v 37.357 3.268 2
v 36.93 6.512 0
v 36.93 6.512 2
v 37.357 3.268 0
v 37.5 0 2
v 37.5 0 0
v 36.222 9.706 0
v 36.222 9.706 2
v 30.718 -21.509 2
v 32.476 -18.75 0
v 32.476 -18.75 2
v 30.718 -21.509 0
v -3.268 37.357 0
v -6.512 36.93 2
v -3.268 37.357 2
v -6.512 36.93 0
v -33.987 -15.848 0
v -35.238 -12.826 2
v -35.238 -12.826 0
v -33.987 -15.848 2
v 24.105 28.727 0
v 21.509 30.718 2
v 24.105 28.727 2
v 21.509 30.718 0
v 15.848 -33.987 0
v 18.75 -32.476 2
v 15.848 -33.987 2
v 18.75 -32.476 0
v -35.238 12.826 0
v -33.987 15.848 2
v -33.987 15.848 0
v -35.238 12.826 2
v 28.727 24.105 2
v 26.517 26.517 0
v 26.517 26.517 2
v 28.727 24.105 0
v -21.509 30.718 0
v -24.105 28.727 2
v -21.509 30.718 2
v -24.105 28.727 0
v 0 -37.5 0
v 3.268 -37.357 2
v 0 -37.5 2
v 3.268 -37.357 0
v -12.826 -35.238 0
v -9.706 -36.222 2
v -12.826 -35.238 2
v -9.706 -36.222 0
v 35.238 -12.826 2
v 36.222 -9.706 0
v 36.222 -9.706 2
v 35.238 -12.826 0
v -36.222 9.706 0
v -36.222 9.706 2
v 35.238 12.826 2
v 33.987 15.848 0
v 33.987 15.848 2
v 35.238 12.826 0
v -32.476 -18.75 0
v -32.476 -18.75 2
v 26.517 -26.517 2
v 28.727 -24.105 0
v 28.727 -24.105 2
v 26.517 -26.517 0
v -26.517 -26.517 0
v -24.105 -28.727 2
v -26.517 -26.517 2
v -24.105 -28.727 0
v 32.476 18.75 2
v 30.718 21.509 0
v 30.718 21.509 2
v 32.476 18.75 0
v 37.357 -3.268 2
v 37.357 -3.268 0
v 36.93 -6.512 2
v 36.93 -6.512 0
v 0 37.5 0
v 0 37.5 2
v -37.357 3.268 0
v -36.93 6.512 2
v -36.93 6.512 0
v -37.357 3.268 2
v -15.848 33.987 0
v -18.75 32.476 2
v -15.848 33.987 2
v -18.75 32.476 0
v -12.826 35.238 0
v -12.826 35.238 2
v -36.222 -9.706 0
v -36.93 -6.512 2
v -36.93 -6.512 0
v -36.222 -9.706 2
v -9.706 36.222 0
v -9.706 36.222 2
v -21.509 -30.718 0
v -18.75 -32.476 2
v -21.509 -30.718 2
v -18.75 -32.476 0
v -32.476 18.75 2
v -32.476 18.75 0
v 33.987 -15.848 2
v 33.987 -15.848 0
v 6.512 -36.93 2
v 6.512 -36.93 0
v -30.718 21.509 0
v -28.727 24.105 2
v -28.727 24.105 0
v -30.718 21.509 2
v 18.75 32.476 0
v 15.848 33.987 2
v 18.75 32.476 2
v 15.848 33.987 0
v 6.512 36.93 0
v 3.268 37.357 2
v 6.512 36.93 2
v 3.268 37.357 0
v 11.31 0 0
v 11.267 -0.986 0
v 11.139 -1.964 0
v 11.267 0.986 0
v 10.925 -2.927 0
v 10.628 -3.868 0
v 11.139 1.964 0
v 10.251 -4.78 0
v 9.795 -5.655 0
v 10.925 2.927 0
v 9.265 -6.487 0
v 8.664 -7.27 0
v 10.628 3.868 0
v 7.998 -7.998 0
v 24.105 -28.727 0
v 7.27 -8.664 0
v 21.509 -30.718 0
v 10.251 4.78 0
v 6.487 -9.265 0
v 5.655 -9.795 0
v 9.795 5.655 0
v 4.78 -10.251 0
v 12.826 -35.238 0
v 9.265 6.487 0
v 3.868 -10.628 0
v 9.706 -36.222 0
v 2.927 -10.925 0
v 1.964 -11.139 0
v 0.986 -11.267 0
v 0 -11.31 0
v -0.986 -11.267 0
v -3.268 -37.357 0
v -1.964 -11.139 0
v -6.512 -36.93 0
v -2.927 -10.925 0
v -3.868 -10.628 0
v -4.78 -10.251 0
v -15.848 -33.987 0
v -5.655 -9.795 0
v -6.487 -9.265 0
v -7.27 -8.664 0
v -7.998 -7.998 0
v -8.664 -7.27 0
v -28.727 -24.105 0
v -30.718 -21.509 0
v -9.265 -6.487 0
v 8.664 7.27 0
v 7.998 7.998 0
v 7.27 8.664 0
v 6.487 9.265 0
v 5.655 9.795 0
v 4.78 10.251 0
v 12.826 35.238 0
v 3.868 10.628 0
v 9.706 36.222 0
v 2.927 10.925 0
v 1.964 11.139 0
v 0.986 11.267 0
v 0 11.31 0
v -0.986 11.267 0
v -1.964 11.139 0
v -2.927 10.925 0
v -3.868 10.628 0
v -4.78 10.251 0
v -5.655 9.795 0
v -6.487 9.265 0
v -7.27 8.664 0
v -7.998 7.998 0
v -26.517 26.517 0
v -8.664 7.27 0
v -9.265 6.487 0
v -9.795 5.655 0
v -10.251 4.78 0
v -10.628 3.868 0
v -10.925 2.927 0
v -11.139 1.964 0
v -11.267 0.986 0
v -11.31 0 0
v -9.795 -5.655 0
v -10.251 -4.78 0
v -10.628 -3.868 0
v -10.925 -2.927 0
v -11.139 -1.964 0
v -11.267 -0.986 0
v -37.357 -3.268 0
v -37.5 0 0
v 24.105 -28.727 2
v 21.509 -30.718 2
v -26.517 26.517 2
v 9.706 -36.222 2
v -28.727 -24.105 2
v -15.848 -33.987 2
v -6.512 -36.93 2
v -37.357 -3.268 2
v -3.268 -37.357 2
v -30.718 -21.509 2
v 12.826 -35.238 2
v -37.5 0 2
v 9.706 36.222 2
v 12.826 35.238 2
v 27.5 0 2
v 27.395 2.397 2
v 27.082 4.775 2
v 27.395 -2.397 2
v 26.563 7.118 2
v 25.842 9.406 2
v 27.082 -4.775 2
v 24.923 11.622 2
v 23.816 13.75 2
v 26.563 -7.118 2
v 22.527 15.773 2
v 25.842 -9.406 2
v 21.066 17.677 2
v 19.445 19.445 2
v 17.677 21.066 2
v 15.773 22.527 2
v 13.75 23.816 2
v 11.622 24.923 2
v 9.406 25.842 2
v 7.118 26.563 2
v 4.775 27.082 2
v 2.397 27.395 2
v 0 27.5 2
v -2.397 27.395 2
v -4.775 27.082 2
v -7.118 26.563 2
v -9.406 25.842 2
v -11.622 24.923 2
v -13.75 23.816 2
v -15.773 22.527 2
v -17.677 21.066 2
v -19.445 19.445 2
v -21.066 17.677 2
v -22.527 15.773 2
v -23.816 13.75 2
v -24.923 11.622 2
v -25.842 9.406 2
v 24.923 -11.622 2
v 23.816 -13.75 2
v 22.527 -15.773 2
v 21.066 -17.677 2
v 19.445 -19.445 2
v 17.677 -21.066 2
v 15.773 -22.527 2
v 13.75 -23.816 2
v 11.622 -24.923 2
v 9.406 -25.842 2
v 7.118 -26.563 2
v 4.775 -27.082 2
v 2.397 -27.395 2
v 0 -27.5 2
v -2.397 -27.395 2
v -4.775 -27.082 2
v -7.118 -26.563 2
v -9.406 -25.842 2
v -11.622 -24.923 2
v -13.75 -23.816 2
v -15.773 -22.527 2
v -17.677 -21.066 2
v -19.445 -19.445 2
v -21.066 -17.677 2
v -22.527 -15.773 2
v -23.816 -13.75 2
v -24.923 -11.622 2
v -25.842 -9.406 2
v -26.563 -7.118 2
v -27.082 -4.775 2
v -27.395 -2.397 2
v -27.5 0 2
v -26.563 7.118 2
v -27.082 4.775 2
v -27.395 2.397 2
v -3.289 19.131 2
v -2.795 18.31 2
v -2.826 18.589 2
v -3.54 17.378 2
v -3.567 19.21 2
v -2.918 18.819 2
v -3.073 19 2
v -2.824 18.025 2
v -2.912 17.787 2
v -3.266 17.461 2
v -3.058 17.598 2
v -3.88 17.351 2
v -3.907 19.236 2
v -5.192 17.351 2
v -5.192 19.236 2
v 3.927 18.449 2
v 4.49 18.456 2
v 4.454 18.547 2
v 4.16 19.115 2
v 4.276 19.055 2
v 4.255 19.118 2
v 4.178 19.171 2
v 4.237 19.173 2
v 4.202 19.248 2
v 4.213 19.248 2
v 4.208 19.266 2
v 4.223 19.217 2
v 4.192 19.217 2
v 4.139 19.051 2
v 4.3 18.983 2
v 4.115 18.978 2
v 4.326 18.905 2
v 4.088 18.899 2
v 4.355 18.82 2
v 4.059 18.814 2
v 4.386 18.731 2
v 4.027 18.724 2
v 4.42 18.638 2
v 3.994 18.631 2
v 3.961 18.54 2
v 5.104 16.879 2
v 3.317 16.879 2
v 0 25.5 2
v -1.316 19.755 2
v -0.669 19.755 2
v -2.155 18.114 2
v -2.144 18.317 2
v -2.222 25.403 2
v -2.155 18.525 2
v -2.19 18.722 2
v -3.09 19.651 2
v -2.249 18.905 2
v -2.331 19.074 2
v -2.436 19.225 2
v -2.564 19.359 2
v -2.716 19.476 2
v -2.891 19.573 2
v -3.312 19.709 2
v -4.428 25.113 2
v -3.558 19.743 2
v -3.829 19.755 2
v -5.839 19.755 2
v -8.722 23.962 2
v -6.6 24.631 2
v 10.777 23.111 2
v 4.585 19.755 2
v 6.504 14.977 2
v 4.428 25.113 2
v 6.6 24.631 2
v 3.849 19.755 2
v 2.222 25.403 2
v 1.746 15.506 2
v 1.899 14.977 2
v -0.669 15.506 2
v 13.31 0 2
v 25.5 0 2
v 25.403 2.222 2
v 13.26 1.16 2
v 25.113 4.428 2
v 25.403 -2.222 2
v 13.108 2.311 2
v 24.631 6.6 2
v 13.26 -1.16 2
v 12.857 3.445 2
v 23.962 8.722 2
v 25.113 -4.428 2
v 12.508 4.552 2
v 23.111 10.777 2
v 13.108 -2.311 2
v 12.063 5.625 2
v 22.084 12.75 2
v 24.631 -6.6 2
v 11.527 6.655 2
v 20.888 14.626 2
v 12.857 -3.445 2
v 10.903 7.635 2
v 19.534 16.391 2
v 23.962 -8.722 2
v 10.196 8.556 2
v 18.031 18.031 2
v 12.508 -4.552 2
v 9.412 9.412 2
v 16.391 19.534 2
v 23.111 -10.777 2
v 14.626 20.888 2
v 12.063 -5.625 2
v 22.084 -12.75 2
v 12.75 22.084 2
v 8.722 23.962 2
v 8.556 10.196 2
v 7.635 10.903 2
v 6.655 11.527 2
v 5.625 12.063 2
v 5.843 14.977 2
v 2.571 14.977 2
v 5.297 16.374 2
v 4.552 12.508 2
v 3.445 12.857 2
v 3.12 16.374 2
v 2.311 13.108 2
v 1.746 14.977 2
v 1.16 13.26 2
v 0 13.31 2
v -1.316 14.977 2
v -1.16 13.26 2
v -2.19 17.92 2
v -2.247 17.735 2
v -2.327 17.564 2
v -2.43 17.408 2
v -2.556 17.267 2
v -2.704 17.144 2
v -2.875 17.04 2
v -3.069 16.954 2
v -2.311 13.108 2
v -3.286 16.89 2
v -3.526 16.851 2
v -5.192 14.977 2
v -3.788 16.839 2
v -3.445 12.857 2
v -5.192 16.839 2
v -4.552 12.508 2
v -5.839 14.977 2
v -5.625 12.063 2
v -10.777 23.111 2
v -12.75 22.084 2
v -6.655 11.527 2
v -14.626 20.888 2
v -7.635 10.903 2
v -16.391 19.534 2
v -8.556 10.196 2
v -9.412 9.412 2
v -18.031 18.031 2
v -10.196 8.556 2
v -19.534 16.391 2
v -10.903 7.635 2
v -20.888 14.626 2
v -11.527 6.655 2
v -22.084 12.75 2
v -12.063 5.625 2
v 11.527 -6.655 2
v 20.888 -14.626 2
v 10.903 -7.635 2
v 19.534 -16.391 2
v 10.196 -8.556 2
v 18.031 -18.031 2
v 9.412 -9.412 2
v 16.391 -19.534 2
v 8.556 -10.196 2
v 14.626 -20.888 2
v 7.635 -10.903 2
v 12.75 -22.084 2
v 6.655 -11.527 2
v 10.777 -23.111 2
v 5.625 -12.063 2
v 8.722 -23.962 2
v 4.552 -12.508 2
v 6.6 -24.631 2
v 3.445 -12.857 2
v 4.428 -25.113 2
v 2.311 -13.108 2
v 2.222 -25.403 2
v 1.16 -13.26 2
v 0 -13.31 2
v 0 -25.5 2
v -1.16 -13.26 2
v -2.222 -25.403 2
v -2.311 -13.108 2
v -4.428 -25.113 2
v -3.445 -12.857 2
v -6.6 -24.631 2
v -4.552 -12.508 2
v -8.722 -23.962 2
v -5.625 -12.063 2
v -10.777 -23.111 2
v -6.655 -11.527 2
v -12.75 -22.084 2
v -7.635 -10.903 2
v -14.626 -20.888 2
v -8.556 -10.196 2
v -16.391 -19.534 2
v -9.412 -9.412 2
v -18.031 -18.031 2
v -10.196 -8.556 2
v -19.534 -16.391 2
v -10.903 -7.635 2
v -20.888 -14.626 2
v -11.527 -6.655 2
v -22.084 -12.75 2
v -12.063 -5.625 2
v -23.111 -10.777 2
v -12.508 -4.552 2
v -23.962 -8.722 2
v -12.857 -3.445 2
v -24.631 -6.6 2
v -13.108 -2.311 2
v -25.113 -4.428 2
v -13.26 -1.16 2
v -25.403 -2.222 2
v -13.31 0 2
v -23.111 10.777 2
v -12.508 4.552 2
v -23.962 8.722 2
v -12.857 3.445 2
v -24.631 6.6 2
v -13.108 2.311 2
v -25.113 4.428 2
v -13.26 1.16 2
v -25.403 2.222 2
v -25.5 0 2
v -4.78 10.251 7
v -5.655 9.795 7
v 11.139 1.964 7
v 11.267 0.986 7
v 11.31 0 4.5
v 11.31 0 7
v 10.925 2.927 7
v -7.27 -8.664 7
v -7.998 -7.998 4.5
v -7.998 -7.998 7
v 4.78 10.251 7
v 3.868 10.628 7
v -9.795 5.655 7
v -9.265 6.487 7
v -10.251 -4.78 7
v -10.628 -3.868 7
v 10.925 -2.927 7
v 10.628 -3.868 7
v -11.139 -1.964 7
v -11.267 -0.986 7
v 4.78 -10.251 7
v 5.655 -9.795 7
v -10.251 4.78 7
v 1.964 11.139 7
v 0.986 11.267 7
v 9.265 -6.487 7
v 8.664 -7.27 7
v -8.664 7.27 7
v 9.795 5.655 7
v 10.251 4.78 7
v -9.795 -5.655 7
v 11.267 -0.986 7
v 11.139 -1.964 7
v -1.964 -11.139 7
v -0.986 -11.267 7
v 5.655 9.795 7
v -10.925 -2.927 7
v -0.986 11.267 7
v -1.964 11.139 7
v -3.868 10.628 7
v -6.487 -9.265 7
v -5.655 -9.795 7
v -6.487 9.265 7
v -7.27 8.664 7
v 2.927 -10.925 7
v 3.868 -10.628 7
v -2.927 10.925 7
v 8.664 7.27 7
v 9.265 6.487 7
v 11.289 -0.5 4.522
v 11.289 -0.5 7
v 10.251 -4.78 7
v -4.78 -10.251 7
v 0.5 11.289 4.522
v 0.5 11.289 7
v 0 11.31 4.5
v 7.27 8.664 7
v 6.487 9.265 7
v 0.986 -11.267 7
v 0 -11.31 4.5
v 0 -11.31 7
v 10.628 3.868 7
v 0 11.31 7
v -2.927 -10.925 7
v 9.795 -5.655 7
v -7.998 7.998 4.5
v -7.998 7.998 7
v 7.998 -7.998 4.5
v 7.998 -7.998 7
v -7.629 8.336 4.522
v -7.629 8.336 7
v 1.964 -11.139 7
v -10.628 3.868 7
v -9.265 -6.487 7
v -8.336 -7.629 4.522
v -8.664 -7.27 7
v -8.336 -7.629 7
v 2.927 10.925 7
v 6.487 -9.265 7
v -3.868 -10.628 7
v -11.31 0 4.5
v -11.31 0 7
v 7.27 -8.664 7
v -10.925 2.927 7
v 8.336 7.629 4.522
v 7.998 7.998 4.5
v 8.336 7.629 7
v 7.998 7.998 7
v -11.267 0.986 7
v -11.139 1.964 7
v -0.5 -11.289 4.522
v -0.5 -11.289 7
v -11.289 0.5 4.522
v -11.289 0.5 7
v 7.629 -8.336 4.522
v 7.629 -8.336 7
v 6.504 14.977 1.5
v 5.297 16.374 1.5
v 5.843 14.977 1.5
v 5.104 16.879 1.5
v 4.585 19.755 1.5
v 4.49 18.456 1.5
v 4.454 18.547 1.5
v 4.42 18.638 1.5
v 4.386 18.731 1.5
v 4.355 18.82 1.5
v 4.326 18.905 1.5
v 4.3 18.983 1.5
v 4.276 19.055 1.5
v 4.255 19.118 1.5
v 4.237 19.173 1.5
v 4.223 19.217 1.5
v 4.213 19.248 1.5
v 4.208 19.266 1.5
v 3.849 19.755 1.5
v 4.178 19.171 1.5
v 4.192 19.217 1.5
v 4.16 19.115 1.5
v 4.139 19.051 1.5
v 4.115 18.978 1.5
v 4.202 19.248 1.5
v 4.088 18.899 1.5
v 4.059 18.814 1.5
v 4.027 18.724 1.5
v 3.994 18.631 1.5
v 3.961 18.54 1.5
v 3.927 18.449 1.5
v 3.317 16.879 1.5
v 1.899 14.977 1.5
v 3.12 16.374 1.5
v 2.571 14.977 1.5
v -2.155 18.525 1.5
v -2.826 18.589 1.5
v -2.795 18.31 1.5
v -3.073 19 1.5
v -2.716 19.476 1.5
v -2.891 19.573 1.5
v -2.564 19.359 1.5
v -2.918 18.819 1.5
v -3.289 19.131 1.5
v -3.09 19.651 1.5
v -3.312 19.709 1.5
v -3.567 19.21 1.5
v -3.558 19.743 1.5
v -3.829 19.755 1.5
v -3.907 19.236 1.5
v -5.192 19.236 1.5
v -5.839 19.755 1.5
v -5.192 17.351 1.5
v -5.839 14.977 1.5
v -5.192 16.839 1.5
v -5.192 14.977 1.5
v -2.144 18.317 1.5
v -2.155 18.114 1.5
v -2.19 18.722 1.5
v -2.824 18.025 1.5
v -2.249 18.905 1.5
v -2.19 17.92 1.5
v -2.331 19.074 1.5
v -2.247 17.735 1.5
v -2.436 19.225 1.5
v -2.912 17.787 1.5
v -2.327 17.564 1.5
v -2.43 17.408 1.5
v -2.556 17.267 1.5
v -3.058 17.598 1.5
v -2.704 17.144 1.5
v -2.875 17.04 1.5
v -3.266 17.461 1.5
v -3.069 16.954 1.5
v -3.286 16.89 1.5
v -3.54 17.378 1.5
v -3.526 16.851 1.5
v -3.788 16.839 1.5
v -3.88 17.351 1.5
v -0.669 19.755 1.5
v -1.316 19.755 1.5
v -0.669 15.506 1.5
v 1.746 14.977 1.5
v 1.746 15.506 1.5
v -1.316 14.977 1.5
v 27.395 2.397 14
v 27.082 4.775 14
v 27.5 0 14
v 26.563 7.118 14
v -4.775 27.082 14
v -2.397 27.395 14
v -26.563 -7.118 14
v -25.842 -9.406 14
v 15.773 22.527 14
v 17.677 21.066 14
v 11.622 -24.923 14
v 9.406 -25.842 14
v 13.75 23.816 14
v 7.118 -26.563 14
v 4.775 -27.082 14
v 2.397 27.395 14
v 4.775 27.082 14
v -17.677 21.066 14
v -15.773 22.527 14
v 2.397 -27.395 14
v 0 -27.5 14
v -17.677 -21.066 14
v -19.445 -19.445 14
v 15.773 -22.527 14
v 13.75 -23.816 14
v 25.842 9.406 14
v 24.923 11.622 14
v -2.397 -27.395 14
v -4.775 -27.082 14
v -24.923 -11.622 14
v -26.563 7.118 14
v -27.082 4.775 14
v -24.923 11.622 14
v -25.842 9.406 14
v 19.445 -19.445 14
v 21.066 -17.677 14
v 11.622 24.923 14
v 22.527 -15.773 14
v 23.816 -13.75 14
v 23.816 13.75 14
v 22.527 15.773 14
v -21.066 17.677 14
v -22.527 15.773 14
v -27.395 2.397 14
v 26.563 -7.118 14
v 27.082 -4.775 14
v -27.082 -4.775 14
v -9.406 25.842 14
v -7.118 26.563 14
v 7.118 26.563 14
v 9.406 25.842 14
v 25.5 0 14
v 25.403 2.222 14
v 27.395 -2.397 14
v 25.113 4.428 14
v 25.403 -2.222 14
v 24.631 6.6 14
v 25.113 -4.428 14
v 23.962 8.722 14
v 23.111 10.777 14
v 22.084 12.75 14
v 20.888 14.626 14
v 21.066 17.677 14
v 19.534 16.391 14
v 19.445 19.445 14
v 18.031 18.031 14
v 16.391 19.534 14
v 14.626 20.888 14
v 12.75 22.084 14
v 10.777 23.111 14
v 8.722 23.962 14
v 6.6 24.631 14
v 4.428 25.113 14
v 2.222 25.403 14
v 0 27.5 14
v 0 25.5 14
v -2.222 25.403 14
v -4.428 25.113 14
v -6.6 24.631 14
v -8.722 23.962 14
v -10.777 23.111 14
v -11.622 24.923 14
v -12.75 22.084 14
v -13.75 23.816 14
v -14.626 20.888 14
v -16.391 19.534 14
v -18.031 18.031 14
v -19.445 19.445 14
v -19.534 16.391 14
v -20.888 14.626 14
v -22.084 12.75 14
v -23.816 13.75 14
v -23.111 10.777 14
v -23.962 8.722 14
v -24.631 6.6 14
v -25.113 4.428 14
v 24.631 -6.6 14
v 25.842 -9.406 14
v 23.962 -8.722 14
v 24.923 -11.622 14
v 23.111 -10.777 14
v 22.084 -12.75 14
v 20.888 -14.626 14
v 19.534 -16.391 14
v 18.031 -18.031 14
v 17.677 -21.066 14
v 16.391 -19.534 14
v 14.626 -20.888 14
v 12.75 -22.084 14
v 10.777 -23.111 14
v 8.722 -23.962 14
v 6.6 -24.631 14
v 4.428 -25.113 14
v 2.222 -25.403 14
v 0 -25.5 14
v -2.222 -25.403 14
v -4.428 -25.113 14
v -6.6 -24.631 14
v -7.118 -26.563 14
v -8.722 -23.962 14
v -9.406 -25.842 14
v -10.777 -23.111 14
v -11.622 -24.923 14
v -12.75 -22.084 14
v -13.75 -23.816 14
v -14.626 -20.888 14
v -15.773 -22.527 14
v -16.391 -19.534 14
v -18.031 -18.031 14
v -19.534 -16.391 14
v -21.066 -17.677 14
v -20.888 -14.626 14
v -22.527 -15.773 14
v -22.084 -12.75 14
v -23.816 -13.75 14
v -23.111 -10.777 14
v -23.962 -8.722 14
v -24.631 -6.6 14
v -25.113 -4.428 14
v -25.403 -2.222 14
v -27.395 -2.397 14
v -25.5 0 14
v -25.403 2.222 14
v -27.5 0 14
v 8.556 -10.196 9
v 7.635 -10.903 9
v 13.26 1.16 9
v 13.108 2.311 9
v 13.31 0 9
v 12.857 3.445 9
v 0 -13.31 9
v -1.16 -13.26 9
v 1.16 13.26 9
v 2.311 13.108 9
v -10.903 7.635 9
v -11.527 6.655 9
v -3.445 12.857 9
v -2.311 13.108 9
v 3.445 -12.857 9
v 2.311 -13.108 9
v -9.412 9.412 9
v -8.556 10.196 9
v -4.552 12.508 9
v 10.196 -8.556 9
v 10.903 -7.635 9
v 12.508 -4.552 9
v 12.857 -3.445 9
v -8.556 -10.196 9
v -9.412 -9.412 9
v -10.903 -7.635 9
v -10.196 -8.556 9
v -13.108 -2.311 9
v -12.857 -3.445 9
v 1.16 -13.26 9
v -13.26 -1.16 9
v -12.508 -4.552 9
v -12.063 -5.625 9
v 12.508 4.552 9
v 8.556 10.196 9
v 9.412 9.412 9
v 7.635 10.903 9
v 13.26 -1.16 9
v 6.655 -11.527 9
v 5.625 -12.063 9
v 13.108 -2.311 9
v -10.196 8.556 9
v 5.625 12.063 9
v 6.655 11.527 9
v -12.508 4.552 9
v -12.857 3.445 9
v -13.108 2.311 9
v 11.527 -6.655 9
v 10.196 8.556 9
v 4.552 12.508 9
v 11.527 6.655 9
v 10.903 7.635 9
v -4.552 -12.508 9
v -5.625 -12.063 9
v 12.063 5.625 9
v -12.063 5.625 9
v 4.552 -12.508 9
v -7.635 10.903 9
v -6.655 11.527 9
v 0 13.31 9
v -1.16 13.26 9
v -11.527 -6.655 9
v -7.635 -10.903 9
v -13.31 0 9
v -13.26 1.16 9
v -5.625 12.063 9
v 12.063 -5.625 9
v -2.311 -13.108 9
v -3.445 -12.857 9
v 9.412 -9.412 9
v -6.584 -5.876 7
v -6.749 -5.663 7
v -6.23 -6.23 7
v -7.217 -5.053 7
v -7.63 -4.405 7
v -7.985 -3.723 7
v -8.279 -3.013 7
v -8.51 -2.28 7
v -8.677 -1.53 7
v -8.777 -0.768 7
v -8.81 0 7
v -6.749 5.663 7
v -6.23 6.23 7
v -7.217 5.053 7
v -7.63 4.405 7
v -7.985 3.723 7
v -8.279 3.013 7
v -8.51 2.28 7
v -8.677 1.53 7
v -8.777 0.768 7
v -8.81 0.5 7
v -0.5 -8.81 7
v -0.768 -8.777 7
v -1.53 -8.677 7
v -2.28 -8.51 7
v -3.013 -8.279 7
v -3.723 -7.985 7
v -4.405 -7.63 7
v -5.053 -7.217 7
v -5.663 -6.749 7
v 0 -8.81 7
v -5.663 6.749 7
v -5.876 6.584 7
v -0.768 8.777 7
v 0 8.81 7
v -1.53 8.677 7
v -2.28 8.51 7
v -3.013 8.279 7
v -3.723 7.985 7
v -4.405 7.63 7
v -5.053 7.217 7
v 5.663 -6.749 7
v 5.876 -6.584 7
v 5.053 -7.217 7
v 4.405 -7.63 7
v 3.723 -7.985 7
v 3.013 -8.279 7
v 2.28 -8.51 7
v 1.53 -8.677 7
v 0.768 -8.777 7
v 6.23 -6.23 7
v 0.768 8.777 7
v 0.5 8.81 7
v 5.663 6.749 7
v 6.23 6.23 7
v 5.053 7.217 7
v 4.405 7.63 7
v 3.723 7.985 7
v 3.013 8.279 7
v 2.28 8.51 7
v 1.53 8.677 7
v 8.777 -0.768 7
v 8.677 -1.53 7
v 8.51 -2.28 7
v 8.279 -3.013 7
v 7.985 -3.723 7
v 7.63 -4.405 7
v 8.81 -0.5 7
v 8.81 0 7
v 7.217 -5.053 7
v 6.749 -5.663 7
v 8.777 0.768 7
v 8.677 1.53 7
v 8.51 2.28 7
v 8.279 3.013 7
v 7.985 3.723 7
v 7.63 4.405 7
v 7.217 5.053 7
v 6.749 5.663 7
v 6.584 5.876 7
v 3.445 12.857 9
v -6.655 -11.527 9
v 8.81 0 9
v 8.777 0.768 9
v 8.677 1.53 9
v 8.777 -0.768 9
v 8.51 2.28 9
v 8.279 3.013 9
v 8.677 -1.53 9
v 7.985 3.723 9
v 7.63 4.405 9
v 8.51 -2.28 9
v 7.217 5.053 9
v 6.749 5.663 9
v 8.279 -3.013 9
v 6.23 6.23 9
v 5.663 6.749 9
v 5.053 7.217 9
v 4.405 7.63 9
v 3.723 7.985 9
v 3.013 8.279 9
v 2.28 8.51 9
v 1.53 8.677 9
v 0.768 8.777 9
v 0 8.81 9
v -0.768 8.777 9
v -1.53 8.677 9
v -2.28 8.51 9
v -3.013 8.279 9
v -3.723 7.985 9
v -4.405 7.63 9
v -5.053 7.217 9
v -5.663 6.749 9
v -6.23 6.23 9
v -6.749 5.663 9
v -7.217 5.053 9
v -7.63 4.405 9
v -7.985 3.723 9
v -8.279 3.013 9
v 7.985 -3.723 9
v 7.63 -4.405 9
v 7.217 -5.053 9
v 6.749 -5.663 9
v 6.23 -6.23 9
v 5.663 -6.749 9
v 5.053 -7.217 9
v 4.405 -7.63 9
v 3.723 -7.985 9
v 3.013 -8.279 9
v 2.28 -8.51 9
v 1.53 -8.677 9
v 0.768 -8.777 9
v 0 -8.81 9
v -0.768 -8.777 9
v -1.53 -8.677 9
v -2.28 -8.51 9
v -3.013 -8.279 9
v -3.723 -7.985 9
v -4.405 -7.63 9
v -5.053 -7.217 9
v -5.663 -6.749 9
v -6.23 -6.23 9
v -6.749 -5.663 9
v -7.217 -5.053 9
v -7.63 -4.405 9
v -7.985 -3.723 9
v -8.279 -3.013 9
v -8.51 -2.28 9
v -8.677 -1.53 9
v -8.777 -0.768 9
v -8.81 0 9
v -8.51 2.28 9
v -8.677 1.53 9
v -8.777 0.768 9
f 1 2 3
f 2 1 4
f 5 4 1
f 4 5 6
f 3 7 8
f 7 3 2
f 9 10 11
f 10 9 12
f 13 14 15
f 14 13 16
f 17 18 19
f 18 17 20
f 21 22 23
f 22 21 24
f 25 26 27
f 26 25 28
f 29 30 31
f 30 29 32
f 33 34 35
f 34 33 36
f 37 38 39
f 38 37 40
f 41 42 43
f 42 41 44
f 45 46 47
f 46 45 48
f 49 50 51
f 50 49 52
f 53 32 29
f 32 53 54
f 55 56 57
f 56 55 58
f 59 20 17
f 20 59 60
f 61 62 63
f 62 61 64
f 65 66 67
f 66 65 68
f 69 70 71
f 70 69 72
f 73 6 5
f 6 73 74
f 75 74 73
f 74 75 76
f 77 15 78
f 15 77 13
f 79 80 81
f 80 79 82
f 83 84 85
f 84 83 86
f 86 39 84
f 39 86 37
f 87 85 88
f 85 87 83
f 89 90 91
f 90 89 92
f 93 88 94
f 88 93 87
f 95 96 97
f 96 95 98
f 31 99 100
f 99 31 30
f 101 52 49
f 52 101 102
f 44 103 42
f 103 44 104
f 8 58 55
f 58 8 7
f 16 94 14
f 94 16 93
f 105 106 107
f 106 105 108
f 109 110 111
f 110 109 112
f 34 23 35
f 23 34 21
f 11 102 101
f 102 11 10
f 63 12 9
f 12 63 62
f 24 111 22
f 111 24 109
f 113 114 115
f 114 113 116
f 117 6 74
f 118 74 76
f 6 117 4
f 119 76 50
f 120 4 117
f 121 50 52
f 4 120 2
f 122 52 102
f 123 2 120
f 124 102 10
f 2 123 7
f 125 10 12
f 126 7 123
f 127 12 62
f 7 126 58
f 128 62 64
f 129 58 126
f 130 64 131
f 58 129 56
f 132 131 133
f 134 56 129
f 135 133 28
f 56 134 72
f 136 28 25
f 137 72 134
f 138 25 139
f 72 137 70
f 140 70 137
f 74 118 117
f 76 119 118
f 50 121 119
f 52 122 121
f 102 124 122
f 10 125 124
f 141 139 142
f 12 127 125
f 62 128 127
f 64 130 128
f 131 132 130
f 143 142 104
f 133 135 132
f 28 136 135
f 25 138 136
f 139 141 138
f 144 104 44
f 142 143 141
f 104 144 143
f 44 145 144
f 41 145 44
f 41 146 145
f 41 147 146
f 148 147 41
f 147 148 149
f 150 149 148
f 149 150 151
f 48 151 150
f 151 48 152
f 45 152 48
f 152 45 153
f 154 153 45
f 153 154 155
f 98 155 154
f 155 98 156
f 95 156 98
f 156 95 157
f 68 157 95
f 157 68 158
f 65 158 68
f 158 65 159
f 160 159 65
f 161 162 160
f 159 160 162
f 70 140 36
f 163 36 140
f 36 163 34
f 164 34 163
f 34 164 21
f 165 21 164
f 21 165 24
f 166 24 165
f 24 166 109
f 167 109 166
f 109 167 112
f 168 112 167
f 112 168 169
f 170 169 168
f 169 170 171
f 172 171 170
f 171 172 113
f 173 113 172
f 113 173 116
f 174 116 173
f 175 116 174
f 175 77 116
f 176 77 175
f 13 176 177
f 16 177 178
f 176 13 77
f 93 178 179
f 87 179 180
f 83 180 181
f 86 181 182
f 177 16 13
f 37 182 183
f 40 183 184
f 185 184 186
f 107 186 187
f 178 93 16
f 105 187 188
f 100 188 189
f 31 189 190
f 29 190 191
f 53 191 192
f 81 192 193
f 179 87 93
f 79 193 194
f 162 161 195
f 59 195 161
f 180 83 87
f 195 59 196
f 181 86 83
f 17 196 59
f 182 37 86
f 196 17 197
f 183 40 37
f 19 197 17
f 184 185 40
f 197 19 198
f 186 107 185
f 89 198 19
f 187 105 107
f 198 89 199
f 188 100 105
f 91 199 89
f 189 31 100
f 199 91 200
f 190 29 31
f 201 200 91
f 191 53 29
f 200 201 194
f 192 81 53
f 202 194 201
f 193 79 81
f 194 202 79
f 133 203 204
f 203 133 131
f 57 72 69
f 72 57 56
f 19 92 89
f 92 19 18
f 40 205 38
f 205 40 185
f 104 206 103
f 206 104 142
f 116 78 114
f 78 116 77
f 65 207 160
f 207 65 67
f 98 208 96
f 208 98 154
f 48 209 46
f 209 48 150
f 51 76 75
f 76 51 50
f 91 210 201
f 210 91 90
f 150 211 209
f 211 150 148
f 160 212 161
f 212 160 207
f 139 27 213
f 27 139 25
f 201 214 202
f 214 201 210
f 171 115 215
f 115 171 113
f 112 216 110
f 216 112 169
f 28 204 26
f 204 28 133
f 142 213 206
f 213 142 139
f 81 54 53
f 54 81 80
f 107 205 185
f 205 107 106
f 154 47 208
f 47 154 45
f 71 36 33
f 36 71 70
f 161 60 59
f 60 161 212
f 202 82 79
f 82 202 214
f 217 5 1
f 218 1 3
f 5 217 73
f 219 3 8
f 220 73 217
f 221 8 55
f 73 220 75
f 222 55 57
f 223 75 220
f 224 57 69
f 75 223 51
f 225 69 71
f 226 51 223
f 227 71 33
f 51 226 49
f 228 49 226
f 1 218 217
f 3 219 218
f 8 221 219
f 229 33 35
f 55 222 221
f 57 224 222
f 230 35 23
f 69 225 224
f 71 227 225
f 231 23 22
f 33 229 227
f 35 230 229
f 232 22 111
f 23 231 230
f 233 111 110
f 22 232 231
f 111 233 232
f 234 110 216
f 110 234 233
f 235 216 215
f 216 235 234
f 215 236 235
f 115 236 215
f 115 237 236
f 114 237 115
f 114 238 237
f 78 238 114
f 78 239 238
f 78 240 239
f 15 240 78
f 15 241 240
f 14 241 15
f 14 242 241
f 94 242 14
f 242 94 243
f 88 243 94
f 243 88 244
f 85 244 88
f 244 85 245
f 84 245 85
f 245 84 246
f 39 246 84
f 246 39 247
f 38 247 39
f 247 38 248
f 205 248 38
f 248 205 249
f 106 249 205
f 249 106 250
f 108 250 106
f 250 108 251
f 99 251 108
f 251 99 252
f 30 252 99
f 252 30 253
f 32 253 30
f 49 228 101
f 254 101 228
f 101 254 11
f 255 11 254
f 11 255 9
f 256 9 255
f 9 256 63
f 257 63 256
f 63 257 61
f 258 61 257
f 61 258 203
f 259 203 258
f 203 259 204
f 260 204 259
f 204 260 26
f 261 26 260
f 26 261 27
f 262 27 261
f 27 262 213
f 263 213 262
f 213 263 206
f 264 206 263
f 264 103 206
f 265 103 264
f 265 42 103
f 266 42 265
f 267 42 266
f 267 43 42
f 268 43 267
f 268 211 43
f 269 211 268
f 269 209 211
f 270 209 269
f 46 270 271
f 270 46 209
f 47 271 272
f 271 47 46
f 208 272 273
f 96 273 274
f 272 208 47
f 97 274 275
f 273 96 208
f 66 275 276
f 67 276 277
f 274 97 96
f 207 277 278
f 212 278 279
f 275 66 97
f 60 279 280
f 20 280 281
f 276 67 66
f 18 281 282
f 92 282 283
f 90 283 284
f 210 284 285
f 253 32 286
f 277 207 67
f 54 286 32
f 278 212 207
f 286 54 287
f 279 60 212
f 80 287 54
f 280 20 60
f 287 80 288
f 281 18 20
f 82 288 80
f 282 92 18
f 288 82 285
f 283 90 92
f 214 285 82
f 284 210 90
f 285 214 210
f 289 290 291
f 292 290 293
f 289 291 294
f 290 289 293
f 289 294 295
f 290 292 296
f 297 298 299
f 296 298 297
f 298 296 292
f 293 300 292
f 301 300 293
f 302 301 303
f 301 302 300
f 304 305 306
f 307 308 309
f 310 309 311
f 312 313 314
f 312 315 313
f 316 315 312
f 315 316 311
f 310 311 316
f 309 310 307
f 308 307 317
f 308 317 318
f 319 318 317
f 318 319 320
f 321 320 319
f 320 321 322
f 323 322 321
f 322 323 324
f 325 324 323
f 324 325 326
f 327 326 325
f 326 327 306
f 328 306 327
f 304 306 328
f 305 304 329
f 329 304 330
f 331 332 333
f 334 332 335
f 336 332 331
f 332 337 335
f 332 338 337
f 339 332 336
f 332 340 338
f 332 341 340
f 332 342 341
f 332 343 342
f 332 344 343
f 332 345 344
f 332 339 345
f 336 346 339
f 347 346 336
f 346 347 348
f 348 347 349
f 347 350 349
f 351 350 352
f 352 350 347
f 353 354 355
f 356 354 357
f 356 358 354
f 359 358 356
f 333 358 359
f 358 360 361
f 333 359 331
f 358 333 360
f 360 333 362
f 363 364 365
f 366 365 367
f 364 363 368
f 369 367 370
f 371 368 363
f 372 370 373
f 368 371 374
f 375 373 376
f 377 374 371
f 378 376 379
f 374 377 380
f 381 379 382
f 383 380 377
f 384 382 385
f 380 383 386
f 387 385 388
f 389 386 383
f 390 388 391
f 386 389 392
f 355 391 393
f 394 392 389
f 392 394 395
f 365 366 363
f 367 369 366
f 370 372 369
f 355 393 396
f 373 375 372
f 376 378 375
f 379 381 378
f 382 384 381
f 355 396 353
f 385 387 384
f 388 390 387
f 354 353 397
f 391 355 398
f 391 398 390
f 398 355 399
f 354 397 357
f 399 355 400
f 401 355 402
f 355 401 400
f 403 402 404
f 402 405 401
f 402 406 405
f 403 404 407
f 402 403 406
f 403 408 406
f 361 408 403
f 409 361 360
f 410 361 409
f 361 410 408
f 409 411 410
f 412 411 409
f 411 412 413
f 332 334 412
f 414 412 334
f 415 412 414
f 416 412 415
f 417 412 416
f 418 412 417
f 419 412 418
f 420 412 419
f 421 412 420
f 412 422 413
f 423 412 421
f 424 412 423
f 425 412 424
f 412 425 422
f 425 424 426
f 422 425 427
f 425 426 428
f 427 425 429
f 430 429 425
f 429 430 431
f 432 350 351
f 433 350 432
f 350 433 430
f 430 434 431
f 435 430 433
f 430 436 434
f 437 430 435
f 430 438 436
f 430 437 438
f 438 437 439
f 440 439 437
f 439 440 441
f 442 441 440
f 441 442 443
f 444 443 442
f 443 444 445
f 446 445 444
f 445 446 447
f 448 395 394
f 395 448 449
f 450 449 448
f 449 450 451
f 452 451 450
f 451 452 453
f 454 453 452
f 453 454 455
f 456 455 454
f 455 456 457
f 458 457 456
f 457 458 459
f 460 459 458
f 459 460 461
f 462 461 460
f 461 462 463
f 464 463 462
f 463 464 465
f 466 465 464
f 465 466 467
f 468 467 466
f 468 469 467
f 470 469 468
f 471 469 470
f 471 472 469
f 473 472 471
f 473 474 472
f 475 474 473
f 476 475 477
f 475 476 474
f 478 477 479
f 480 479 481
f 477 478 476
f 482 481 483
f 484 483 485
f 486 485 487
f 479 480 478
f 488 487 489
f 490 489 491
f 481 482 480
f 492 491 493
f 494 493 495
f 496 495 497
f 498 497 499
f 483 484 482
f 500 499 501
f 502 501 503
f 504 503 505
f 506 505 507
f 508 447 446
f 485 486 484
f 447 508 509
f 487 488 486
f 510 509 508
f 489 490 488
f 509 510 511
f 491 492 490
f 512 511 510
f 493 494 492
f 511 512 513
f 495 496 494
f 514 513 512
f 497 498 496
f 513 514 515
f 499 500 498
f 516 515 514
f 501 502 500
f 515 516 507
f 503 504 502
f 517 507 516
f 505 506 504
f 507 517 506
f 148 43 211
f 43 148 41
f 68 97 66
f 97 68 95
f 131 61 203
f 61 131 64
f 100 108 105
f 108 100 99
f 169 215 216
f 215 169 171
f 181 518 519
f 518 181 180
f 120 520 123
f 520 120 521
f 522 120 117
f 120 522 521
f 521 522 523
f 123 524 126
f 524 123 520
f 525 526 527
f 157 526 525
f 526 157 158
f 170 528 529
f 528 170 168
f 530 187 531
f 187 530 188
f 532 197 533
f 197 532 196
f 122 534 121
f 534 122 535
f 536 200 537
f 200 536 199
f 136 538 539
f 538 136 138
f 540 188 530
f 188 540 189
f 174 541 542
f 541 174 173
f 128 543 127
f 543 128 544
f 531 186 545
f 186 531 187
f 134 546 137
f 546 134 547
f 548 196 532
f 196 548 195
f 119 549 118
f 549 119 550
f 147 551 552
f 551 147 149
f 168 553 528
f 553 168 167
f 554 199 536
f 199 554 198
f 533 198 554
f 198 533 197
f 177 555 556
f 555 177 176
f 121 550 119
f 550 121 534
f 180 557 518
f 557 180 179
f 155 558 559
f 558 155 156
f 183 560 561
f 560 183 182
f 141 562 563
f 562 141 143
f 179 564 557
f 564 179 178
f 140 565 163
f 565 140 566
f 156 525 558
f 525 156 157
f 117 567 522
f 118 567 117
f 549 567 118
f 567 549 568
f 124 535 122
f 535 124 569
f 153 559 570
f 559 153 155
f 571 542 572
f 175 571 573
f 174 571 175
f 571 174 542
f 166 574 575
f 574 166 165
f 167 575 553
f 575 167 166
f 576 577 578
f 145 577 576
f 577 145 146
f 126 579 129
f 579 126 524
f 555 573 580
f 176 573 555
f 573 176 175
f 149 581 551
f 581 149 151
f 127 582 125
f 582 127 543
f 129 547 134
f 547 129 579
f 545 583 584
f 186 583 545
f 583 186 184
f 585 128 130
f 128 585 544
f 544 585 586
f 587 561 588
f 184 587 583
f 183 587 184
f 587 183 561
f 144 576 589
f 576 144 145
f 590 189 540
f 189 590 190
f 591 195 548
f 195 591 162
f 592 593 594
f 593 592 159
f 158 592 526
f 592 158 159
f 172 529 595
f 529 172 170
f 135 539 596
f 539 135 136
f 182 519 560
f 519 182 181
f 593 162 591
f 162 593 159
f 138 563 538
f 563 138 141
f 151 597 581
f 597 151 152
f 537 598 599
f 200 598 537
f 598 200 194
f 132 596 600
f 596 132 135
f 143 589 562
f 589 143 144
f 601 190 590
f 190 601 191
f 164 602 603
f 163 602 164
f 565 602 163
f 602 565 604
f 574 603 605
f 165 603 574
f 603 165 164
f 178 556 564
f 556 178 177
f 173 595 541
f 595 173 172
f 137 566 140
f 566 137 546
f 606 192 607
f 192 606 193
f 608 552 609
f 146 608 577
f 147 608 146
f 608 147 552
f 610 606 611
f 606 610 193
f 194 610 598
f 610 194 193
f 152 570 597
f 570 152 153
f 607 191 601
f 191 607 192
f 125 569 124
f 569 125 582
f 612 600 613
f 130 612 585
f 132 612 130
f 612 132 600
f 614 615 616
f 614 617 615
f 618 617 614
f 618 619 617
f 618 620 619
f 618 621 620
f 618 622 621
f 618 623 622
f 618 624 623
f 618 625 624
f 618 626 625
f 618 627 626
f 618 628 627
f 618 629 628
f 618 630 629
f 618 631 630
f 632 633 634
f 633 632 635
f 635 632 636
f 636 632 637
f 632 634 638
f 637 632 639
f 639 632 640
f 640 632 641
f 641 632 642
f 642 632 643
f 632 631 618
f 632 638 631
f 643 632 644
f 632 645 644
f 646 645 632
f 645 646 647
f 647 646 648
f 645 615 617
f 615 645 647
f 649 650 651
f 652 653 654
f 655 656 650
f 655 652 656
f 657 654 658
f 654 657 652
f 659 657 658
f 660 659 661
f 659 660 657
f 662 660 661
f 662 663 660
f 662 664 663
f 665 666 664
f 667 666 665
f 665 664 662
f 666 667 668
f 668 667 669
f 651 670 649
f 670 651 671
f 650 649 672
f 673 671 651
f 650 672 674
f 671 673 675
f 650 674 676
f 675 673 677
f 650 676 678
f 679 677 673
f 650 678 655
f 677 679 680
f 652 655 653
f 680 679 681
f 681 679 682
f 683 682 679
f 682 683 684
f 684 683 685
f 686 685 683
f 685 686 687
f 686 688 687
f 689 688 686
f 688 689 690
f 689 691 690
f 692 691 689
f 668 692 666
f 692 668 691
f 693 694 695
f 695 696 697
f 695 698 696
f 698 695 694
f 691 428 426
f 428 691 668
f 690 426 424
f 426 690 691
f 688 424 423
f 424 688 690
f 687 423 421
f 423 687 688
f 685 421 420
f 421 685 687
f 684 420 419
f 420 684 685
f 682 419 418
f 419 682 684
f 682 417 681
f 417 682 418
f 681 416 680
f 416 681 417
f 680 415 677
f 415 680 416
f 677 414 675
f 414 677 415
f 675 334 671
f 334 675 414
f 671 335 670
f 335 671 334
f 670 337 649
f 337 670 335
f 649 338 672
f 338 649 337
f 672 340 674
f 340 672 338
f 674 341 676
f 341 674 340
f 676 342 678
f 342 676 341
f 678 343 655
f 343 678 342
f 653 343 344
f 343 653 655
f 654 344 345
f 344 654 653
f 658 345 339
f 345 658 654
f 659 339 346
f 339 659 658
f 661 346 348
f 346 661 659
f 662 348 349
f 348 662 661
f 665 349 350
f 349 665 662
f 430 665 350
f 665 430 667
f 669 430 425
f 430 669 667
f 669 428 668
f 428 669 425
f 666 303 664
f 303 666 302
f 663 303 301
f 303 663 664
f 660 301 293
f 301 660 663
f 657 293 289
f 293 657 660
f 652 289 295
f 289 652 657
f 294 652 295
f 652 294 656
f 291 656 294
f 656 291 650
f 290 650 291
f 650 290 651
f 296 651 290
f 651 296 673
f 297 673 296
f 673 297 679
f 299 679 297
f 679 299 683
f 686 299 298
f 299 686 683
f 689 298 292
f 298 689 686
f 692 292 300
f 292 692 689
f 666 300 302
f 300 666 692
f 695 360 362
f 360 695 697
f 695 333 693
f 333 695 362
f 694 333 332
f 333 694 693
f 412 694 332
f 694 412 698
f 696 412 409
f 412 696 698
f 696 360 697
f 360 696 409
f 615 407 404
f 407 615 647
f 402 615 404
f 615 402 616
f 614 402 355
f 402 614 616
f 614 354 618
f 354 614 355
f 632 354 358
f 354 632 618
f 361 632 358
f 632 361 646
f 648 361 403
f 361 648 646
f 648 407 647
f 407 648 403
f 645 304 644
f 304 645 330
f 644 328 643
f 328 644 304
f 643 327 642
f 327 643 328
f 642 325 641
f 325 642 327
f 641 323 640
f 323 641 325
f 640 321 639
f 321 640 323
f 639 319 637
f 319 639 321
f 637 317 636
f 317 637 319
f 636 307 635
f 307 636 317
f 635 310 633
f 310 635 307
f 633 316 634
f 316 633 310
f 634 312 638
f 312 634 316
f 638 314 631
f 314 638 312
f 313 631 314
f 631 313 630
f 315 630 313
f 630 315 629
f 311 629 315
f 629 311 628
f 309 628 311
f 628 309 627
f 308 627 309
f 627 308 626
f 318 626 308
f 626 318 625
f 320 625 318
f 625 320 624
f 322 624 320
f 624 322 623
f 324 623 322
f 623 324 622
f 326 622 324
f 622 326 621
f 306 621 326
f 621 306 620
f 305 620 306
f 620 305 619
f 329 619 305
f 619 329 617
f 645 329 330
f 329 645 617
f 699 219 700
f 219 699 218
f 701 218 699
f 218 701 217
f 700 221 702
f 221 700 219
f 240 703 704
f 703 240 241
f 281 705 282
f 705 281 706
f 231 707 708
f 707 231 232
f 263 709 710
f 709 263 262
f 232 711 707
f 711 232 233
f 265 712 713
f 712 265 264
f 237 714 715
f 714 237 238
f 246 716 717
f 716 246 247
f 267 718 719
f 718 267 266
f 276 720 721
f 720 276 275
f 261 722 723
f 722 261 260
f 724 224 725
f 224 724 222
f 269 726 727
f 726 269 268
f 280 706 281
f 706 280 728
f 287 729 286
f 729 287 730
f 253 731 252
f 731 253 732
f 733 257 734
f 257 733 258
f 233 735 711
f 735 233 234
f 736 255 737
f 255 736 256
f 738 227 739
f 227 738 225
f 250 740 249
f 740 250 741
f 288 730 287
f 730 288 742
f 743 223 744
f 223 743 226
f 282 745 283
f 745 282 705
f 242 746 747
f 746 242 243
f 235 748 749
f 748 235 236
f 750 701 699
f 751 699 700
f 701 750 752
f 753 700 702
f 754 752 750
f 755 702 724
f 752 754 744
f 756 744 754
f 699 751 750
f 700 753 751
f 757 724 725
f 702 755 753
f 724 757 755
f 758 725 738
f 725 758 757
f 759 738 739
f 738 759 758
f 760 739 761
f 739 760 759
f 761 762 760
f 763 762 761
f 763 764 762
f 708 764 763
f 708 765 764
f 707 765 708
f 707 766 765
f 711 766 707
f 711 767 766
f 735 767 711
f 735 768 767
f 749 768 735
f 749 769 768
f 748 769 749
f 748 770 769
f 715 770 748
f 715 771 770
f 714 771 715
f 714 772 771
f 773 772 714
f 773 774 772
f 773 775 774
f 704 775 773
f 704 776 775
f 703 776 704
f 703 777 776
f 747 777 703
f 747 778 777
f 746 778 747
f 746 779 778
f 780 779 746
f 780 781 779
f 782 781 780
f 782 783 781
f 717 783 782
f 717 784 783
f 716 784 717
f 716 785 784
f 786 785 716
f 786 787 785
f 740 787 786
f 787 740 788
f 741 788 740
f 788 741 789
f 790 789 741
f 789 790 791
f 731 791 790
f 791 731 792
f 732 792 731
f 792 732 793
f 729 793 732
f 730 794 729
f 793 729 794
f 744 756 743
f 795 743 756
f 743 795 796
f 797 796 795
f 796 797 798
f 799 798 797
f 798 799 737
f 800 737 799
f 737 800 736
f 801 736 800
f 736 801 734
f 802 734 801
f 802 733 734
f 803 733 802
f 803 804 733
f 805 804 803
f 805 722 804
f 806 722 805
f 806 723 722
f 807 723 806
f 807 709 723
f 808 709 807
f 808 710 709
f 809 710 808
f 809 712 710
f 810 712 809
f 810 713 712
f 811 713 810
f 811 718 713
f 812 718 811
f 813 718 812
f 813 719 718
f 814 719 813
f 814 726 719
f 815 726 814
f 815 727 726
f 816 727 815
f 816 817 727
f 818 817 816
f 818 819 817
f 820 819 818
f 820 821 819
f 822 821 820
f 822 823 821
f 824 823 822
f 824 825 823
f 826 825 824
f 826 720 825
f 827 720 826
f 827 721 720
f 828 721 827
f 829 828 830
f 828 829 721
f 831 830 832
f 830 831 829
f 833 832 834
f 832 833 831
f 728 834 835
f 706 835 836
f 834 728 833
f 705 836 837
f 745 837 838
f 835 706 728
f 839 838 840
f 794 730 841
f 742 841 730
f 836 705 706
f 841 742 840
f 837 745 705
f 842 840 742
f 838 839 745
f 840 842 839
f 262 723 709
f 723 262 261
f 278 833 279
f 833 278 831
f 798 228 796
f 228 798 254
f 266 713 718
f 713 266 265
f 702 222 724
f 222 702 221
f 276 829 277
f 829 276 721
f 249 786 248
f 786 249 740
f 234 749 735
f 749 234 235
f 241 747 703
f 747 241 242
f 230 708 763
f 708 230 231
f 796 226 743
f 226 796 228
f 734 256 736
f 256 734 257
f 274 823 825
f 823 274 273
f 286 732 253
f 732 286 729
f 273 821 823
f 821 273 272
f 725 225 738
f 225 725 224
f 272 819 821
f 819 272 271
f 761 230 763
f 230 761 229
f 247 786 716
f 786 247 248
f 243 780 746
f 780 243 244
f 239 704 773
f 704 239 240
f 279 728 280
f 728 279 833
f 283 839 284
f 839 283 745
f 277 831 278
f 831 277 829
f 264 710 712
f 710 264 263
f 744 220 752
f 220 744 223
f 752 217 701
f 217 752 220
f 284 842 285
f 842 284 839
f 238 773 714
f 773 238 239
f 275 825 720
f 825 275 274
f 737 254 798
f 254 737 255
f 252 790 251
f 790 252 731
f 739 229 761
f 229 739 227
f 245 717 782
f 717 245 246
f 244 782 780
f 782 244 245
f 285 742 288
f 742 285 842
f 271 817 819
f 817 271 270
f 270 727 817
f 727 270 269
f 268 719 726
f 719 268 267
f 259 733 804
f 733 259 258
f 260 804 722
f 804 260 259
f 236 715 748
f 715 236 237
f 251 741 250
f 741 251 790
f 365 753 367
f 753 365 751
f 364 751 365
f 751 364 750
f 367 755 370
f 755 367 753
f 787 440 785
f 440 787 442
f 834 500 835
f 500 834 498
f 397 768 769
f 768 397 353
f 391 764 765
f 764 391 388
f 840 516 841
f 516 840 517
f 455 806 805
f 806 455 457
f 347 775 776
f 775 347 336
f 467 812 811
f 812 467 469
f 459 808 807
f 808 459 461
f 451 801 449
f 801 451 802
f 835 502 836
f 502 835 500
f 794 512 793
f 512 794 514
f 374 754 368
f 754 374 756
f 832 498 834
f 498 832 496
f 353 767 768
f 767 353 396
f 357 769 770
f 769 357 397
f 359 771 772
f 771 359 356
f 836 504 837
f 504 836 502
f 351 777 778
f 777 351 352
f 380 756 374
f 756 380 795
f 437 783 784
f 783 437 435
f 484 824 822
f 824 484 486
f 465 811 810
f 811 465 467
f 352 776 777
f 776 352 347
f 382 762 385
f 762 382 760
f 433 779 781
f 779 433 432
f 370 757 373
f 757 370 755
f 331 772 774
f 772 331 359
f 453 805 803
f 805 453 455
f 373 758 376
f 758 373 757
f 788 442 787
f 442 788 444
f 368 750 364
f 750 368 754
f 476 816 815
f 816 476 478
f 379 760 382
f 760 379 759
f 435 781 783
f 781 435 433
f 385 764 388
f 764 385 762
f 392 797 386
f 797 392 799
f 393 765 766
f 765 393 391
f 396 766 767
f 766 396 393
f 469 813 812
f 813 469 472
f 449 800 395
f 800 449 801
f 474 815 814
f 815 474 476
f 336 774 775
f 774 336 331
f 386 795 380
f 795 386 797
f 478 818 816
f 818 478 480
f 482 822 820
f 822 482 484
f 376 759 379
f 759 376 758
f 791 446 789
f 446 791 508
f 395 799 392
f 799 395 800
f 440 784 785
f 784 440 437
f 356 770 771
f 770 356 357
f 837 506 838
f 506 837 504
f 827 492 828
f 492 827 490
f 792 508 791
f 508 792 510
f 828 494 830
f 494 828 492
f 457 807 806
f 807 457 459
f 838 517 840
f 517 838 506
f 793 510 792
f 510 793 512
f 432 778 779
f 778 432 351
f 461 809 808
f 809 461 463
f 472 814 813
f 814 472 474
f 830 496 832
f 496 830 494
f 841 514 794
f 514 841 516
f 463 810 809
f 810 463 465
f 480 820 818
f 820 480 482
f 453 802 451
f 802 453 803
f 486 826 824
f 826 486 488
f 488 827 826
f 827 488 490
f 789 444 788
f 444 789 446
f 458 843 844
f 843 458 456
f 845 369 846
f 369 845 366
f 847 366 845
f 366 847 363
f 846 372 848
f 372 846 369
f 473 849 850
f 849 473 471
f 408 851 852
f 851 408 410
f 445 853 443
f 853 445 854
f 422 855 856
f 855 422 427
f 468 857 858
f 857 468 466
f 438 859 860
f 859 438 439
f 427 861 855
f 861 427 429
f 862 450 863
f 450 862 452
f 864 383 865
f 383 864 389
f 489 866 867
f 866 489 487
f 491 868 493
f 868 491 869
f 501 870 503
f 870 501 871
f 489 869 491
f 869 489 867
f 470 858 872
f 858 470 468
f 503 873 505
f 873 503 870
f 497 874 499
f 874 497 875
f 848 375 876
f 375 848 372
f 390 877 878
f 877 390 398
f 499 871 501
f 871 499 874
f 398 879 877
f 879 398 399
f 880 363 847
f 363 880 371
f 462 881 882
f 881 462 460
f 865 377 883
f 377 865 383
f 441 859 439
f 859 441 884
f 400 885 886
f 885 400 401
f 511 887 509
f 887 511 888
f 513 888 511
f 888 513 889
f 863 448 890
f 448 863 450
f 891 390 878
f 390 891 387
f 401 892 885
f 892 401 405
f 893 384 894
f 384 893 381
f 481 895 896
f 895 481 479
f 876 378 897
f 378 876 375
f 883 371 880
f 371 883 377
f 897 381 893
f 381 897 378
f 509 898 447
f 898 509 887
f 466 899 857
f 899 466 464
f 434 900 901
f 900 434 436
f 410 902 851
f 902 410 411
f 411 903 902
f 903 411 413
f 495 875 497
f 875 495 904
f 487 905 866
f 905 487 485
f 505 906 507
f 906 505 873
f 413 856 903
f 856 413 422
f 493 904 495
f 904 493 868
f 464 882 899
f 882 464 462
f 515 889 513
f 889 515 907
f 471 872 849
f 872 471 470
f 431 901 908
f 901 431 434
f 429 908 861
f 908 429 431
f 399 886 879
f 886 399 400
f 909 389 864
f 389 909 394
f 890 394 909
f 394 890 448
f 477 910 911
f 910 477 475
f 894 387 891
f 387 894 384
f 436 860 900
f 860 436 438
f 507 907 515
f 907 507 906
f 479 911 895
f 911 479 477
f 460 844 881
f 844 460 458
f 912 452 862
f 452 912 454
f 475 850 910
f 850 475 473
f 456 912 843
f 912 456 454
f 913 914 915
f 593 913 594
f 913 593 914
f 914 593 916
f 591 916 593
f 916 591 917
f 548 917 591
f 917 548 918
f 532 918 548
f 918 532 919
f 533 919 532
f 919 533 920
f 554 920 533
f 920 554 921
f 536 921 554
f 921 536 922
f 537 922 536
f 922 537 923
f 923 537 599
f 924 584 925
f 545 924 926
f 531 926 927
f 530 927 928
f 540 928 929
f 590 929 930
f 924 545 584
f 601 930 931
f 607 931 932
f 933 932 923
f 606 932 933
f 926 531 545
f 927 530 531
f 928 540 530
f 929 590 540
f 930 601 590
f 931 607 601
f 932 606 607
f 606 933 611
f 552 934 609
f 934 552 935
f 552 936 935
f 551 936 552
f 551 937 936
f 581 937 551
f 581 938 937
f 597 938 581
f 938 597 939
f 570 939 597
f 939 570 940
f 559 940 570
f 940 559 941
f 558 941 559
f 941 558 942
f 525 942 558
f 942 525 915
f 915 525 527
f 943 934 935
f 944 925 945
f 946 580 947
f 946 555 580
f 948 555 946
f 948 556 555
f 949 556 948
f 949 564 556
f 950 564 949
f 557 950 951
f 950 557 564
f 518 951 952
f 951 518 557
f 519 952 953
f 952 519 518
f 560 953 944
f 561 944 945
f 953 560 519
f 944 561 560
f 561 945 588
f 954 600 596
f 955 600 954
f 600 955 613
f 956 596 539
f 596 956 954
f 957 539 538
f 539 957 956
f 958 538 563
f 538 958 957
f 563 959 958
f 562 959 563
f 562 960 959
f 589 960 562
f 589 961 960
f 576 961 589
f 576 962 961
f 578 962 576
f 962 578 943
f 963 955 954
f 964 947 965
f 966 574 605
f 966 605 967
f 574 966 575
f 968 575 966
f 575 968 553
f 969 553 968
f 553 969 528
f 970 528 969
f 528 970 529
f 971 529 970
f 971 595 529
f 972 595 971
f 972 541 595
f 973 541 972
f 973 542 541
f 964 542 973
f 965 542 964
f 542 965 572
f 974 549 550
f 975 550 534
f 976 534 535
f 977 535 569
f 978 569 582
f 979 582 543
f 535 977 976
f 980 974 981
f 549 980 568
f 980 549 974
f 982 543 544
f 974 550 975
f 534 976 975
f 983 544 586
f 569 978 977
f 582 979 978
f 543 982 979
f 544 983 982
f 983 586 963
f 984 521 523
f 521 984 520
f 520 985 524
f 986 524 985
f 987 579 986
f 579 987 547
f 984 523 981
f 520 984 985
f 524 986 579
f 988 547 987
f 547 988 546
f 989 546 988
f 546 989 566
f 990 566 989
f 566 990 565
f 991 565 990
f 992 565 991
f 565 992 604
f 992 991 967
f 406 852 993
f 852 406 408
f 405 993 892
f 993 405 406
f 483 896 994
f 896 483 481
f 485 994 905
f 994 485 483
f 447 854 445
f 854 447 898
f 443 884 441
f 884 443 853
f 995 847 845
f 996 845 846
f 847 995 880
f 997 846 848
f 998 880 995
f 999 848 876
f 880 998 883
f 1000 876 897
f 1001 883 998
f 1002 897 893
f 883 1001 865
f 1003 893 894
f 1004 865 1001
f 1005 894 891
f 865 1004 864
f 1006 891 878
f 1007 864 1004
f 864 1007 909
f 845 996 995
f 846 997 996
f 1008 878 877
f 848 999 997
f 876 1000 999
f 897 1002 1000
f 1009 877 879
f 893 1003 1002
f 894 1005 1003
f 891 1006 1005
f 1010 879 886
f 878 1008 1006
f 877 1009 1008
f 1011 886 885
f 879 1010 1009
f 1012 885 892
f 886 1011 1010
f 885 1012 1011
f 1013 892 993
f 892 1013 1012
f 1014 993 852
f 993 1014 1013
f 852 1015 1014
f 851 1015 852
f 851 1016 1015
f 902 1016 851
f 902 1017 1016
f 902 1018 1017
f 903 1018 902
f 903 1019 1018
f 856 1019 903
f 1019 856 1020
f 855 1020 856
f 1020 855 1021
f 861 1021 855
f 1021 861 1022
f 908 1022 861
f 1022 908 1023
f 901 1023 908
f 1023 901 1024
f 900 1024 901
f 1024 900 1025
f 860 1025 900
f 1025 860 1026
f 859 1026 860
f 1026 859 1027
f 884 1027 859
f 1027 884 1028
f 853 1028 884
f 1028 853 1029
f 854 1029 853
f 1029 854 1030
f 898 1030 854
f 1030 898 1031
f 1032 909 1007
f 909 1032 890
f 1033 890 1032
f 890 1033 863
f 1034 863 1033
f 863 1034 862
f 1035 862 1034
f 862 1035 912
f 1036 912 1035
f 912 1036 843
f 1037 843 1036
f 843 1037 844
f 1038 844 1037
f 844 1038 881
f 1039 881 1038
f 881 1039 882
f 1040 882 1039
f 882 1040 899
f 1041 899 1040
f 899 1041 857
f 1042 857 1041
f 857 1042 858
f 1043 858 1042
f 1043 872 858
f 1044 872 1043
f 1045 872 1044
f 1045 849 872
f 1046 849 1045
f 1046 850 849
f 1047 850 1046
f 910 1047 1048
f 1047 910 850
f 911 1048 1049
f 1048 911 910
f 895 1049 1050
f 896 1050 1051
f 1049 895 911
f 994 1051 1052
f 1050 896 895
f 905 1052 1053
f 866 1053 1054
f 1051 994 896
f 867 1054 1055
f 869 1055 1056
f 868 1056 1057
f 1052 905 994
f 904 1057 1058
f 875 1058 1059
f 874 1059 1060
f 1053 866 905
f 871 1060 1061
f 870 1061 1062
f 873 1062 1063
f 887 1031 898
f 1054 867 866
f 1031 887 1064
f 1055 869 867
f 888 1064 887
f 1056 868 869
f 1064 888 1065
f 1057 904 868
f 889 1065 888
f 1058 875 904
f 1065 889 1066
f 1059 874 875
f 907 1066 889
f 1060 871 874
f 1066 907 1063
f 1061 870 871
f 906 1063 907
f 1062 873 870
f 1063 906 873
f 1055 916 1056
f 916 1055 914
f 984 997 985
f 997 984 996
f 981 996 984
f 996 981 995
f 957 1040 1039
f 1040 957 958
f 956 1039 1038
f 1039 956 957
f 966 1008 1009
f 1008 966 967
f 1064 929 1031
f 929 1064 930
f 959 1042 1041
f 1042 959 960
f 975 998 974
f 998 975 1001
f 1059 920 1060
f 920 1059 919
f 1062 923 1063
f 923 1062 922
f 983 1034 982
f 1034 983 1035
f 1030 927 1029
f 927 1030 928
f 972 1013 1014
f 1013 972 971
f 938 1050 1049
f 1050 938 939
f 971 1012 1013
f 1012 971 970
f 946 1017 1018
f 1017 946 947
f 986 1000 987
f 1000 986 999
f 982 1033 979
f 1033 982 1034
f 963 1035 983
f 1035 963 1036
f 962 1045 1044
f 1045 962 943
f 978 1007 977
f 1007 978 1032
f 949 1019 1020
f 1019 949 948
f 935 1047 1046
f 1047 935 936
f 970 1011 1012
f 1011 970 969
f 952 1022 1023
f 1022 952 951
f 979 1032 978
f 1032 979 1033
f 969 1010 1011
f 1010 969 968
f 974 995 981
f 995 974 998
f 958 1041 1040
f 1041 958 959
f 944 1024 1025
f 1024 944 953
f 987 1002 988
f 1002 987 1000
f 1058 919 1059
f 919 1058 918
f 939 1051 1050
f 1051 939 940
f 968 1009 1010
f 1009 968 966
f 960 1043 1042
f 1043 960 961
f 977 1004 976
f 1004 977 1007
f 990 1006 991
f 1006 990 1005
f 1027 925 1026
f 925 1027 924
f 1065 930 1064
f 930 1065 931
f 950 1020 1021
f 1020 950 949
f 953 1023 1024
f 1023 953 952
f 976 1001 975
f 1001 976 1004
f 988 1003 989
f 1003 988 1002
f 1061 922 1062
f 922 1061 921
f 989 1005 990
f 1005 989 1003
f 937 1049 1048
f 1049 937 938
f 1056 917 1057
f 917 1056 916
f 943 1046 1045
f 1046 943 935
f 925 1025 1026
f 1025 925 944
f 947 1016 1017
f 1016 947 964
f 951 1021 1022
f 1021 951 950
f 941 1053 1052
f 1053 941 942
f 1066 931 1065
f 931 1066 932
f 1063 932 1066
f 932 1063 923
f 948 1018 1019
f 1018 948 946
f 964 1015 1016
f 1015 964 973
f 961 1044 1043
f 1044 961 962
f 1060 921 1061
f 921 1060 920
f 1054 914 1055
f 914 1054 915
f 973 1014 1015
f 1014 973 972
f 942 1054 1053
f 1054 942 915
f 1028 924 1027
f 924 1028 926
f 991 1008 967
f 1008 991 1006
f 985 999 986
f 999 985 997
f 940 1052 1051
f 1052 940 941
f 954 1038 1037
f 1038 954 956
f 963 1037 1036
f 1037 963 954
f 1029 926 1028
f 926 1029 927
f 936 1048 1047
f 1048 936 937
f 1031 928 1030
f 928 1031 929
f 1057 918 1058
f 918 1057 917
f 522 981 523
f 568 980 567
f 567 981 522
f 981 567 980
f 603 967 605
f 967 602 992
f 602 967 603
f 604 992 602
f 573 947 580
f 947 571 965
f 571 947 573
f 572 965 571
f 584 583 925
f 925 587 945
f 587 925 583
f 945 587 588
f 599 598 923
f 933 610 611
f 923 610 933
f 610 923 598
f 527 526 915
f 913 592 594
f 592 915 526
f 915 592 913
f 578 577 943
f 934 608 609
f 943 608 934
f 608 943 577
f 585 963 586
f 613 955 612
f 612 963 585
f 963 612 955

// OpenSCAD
/* Copyright (C) 2011  Philipp Klostermann
Email the autor: philipp.klostermann@pksl.de
*/

fn=72;
tol=0.02;
wackel=0.6;
spuleninnendurchmesser=55;
kugellageraussendurchmesser=22;
kugellagerdicke=7;
kugellagerauflagebreite=2.5;
wanddicke=2;
rand=10;
// Materialbeschriftung="";
// Materialbeschriftung="ABS";
Materialbeschriftung="PLA";
praegetiefe=0.5;
praegegroesse=5;

kad = (kugellageraussendurchmesser / cos(180/fn)) + wackel;
echo ("kad korrigiert nach ", kad);

// $fn = fn;

module Ring(durchmesser, hoehe, innendurchmesser)
{
	difference()
	{
		cylinder(h=hoehe, r=durchmesser/2, $fn = fn);
		translate([0,0, -tol])
		cylinder(h=hoehe + tol*2, r=innendurchmesser/2, $fn = fn);
	}
}

module Traeger(hoehe, dicke, entfernung, breite, hoehe)
{
	translate([entfernung,0,0])
	{
		rotate([90,0,0])
		{
			linear_extrude(height=dicke)
			{
				polygon(points = 
				[ 
					[0,0],
					[breite,0],[breite,-hoehe] ]);
			}
		}
	}
}

module Traegerring(dicke, aussenradius, innenradius, winkel)
{
	for(winkel = [0 : winkel : 360-winkel])
	rotate([0,0,winkel])
	{
		Traeger(hoehe, 
				dicke, 
				innenradius, 
				aussenradius-innenradius, 
				aussenradius-innenradius);
	}
}
// Der Boden:
difference()
{
	Ring(spuleninnendurchmesser + 2*rand, wanddicke, kad);
	if (Materialbeschriftung != "")
	translate([0,kad/2+wanddicke+praegegroesse/3,wanddicke-praegetiefe])
	{
		linear_extrude(height=praegetiefe+tol)
		{
			text(text=Materialbeschriftung, halign="center", font="Arial", size=praegegroesse);
		}
	}
}

// Die Halterung für die Spule:
Ring(spuleninnendurchmesser, kugellagerdicke*2, spuleninnendurchmesser - wanddicke*2);
// Die Halterung für das Kugellager:
Ring(kad+wanddicke*2, kugellagerdicke, kad);
// Damit es nicht nach innen rutscht:
translate([0,0,kugellagerdicke])
{
	Ring(kad+wanddicke*2, 
		wanddicke, 
		kad-kugellagerauflagebreite*2);
// Und die Unterstützung als einfach zu entfernender Support:
	Traegerring(0.5, 
			kad/2, 
			kad/2-kugellagerauflagebreite, 
			45);
}
